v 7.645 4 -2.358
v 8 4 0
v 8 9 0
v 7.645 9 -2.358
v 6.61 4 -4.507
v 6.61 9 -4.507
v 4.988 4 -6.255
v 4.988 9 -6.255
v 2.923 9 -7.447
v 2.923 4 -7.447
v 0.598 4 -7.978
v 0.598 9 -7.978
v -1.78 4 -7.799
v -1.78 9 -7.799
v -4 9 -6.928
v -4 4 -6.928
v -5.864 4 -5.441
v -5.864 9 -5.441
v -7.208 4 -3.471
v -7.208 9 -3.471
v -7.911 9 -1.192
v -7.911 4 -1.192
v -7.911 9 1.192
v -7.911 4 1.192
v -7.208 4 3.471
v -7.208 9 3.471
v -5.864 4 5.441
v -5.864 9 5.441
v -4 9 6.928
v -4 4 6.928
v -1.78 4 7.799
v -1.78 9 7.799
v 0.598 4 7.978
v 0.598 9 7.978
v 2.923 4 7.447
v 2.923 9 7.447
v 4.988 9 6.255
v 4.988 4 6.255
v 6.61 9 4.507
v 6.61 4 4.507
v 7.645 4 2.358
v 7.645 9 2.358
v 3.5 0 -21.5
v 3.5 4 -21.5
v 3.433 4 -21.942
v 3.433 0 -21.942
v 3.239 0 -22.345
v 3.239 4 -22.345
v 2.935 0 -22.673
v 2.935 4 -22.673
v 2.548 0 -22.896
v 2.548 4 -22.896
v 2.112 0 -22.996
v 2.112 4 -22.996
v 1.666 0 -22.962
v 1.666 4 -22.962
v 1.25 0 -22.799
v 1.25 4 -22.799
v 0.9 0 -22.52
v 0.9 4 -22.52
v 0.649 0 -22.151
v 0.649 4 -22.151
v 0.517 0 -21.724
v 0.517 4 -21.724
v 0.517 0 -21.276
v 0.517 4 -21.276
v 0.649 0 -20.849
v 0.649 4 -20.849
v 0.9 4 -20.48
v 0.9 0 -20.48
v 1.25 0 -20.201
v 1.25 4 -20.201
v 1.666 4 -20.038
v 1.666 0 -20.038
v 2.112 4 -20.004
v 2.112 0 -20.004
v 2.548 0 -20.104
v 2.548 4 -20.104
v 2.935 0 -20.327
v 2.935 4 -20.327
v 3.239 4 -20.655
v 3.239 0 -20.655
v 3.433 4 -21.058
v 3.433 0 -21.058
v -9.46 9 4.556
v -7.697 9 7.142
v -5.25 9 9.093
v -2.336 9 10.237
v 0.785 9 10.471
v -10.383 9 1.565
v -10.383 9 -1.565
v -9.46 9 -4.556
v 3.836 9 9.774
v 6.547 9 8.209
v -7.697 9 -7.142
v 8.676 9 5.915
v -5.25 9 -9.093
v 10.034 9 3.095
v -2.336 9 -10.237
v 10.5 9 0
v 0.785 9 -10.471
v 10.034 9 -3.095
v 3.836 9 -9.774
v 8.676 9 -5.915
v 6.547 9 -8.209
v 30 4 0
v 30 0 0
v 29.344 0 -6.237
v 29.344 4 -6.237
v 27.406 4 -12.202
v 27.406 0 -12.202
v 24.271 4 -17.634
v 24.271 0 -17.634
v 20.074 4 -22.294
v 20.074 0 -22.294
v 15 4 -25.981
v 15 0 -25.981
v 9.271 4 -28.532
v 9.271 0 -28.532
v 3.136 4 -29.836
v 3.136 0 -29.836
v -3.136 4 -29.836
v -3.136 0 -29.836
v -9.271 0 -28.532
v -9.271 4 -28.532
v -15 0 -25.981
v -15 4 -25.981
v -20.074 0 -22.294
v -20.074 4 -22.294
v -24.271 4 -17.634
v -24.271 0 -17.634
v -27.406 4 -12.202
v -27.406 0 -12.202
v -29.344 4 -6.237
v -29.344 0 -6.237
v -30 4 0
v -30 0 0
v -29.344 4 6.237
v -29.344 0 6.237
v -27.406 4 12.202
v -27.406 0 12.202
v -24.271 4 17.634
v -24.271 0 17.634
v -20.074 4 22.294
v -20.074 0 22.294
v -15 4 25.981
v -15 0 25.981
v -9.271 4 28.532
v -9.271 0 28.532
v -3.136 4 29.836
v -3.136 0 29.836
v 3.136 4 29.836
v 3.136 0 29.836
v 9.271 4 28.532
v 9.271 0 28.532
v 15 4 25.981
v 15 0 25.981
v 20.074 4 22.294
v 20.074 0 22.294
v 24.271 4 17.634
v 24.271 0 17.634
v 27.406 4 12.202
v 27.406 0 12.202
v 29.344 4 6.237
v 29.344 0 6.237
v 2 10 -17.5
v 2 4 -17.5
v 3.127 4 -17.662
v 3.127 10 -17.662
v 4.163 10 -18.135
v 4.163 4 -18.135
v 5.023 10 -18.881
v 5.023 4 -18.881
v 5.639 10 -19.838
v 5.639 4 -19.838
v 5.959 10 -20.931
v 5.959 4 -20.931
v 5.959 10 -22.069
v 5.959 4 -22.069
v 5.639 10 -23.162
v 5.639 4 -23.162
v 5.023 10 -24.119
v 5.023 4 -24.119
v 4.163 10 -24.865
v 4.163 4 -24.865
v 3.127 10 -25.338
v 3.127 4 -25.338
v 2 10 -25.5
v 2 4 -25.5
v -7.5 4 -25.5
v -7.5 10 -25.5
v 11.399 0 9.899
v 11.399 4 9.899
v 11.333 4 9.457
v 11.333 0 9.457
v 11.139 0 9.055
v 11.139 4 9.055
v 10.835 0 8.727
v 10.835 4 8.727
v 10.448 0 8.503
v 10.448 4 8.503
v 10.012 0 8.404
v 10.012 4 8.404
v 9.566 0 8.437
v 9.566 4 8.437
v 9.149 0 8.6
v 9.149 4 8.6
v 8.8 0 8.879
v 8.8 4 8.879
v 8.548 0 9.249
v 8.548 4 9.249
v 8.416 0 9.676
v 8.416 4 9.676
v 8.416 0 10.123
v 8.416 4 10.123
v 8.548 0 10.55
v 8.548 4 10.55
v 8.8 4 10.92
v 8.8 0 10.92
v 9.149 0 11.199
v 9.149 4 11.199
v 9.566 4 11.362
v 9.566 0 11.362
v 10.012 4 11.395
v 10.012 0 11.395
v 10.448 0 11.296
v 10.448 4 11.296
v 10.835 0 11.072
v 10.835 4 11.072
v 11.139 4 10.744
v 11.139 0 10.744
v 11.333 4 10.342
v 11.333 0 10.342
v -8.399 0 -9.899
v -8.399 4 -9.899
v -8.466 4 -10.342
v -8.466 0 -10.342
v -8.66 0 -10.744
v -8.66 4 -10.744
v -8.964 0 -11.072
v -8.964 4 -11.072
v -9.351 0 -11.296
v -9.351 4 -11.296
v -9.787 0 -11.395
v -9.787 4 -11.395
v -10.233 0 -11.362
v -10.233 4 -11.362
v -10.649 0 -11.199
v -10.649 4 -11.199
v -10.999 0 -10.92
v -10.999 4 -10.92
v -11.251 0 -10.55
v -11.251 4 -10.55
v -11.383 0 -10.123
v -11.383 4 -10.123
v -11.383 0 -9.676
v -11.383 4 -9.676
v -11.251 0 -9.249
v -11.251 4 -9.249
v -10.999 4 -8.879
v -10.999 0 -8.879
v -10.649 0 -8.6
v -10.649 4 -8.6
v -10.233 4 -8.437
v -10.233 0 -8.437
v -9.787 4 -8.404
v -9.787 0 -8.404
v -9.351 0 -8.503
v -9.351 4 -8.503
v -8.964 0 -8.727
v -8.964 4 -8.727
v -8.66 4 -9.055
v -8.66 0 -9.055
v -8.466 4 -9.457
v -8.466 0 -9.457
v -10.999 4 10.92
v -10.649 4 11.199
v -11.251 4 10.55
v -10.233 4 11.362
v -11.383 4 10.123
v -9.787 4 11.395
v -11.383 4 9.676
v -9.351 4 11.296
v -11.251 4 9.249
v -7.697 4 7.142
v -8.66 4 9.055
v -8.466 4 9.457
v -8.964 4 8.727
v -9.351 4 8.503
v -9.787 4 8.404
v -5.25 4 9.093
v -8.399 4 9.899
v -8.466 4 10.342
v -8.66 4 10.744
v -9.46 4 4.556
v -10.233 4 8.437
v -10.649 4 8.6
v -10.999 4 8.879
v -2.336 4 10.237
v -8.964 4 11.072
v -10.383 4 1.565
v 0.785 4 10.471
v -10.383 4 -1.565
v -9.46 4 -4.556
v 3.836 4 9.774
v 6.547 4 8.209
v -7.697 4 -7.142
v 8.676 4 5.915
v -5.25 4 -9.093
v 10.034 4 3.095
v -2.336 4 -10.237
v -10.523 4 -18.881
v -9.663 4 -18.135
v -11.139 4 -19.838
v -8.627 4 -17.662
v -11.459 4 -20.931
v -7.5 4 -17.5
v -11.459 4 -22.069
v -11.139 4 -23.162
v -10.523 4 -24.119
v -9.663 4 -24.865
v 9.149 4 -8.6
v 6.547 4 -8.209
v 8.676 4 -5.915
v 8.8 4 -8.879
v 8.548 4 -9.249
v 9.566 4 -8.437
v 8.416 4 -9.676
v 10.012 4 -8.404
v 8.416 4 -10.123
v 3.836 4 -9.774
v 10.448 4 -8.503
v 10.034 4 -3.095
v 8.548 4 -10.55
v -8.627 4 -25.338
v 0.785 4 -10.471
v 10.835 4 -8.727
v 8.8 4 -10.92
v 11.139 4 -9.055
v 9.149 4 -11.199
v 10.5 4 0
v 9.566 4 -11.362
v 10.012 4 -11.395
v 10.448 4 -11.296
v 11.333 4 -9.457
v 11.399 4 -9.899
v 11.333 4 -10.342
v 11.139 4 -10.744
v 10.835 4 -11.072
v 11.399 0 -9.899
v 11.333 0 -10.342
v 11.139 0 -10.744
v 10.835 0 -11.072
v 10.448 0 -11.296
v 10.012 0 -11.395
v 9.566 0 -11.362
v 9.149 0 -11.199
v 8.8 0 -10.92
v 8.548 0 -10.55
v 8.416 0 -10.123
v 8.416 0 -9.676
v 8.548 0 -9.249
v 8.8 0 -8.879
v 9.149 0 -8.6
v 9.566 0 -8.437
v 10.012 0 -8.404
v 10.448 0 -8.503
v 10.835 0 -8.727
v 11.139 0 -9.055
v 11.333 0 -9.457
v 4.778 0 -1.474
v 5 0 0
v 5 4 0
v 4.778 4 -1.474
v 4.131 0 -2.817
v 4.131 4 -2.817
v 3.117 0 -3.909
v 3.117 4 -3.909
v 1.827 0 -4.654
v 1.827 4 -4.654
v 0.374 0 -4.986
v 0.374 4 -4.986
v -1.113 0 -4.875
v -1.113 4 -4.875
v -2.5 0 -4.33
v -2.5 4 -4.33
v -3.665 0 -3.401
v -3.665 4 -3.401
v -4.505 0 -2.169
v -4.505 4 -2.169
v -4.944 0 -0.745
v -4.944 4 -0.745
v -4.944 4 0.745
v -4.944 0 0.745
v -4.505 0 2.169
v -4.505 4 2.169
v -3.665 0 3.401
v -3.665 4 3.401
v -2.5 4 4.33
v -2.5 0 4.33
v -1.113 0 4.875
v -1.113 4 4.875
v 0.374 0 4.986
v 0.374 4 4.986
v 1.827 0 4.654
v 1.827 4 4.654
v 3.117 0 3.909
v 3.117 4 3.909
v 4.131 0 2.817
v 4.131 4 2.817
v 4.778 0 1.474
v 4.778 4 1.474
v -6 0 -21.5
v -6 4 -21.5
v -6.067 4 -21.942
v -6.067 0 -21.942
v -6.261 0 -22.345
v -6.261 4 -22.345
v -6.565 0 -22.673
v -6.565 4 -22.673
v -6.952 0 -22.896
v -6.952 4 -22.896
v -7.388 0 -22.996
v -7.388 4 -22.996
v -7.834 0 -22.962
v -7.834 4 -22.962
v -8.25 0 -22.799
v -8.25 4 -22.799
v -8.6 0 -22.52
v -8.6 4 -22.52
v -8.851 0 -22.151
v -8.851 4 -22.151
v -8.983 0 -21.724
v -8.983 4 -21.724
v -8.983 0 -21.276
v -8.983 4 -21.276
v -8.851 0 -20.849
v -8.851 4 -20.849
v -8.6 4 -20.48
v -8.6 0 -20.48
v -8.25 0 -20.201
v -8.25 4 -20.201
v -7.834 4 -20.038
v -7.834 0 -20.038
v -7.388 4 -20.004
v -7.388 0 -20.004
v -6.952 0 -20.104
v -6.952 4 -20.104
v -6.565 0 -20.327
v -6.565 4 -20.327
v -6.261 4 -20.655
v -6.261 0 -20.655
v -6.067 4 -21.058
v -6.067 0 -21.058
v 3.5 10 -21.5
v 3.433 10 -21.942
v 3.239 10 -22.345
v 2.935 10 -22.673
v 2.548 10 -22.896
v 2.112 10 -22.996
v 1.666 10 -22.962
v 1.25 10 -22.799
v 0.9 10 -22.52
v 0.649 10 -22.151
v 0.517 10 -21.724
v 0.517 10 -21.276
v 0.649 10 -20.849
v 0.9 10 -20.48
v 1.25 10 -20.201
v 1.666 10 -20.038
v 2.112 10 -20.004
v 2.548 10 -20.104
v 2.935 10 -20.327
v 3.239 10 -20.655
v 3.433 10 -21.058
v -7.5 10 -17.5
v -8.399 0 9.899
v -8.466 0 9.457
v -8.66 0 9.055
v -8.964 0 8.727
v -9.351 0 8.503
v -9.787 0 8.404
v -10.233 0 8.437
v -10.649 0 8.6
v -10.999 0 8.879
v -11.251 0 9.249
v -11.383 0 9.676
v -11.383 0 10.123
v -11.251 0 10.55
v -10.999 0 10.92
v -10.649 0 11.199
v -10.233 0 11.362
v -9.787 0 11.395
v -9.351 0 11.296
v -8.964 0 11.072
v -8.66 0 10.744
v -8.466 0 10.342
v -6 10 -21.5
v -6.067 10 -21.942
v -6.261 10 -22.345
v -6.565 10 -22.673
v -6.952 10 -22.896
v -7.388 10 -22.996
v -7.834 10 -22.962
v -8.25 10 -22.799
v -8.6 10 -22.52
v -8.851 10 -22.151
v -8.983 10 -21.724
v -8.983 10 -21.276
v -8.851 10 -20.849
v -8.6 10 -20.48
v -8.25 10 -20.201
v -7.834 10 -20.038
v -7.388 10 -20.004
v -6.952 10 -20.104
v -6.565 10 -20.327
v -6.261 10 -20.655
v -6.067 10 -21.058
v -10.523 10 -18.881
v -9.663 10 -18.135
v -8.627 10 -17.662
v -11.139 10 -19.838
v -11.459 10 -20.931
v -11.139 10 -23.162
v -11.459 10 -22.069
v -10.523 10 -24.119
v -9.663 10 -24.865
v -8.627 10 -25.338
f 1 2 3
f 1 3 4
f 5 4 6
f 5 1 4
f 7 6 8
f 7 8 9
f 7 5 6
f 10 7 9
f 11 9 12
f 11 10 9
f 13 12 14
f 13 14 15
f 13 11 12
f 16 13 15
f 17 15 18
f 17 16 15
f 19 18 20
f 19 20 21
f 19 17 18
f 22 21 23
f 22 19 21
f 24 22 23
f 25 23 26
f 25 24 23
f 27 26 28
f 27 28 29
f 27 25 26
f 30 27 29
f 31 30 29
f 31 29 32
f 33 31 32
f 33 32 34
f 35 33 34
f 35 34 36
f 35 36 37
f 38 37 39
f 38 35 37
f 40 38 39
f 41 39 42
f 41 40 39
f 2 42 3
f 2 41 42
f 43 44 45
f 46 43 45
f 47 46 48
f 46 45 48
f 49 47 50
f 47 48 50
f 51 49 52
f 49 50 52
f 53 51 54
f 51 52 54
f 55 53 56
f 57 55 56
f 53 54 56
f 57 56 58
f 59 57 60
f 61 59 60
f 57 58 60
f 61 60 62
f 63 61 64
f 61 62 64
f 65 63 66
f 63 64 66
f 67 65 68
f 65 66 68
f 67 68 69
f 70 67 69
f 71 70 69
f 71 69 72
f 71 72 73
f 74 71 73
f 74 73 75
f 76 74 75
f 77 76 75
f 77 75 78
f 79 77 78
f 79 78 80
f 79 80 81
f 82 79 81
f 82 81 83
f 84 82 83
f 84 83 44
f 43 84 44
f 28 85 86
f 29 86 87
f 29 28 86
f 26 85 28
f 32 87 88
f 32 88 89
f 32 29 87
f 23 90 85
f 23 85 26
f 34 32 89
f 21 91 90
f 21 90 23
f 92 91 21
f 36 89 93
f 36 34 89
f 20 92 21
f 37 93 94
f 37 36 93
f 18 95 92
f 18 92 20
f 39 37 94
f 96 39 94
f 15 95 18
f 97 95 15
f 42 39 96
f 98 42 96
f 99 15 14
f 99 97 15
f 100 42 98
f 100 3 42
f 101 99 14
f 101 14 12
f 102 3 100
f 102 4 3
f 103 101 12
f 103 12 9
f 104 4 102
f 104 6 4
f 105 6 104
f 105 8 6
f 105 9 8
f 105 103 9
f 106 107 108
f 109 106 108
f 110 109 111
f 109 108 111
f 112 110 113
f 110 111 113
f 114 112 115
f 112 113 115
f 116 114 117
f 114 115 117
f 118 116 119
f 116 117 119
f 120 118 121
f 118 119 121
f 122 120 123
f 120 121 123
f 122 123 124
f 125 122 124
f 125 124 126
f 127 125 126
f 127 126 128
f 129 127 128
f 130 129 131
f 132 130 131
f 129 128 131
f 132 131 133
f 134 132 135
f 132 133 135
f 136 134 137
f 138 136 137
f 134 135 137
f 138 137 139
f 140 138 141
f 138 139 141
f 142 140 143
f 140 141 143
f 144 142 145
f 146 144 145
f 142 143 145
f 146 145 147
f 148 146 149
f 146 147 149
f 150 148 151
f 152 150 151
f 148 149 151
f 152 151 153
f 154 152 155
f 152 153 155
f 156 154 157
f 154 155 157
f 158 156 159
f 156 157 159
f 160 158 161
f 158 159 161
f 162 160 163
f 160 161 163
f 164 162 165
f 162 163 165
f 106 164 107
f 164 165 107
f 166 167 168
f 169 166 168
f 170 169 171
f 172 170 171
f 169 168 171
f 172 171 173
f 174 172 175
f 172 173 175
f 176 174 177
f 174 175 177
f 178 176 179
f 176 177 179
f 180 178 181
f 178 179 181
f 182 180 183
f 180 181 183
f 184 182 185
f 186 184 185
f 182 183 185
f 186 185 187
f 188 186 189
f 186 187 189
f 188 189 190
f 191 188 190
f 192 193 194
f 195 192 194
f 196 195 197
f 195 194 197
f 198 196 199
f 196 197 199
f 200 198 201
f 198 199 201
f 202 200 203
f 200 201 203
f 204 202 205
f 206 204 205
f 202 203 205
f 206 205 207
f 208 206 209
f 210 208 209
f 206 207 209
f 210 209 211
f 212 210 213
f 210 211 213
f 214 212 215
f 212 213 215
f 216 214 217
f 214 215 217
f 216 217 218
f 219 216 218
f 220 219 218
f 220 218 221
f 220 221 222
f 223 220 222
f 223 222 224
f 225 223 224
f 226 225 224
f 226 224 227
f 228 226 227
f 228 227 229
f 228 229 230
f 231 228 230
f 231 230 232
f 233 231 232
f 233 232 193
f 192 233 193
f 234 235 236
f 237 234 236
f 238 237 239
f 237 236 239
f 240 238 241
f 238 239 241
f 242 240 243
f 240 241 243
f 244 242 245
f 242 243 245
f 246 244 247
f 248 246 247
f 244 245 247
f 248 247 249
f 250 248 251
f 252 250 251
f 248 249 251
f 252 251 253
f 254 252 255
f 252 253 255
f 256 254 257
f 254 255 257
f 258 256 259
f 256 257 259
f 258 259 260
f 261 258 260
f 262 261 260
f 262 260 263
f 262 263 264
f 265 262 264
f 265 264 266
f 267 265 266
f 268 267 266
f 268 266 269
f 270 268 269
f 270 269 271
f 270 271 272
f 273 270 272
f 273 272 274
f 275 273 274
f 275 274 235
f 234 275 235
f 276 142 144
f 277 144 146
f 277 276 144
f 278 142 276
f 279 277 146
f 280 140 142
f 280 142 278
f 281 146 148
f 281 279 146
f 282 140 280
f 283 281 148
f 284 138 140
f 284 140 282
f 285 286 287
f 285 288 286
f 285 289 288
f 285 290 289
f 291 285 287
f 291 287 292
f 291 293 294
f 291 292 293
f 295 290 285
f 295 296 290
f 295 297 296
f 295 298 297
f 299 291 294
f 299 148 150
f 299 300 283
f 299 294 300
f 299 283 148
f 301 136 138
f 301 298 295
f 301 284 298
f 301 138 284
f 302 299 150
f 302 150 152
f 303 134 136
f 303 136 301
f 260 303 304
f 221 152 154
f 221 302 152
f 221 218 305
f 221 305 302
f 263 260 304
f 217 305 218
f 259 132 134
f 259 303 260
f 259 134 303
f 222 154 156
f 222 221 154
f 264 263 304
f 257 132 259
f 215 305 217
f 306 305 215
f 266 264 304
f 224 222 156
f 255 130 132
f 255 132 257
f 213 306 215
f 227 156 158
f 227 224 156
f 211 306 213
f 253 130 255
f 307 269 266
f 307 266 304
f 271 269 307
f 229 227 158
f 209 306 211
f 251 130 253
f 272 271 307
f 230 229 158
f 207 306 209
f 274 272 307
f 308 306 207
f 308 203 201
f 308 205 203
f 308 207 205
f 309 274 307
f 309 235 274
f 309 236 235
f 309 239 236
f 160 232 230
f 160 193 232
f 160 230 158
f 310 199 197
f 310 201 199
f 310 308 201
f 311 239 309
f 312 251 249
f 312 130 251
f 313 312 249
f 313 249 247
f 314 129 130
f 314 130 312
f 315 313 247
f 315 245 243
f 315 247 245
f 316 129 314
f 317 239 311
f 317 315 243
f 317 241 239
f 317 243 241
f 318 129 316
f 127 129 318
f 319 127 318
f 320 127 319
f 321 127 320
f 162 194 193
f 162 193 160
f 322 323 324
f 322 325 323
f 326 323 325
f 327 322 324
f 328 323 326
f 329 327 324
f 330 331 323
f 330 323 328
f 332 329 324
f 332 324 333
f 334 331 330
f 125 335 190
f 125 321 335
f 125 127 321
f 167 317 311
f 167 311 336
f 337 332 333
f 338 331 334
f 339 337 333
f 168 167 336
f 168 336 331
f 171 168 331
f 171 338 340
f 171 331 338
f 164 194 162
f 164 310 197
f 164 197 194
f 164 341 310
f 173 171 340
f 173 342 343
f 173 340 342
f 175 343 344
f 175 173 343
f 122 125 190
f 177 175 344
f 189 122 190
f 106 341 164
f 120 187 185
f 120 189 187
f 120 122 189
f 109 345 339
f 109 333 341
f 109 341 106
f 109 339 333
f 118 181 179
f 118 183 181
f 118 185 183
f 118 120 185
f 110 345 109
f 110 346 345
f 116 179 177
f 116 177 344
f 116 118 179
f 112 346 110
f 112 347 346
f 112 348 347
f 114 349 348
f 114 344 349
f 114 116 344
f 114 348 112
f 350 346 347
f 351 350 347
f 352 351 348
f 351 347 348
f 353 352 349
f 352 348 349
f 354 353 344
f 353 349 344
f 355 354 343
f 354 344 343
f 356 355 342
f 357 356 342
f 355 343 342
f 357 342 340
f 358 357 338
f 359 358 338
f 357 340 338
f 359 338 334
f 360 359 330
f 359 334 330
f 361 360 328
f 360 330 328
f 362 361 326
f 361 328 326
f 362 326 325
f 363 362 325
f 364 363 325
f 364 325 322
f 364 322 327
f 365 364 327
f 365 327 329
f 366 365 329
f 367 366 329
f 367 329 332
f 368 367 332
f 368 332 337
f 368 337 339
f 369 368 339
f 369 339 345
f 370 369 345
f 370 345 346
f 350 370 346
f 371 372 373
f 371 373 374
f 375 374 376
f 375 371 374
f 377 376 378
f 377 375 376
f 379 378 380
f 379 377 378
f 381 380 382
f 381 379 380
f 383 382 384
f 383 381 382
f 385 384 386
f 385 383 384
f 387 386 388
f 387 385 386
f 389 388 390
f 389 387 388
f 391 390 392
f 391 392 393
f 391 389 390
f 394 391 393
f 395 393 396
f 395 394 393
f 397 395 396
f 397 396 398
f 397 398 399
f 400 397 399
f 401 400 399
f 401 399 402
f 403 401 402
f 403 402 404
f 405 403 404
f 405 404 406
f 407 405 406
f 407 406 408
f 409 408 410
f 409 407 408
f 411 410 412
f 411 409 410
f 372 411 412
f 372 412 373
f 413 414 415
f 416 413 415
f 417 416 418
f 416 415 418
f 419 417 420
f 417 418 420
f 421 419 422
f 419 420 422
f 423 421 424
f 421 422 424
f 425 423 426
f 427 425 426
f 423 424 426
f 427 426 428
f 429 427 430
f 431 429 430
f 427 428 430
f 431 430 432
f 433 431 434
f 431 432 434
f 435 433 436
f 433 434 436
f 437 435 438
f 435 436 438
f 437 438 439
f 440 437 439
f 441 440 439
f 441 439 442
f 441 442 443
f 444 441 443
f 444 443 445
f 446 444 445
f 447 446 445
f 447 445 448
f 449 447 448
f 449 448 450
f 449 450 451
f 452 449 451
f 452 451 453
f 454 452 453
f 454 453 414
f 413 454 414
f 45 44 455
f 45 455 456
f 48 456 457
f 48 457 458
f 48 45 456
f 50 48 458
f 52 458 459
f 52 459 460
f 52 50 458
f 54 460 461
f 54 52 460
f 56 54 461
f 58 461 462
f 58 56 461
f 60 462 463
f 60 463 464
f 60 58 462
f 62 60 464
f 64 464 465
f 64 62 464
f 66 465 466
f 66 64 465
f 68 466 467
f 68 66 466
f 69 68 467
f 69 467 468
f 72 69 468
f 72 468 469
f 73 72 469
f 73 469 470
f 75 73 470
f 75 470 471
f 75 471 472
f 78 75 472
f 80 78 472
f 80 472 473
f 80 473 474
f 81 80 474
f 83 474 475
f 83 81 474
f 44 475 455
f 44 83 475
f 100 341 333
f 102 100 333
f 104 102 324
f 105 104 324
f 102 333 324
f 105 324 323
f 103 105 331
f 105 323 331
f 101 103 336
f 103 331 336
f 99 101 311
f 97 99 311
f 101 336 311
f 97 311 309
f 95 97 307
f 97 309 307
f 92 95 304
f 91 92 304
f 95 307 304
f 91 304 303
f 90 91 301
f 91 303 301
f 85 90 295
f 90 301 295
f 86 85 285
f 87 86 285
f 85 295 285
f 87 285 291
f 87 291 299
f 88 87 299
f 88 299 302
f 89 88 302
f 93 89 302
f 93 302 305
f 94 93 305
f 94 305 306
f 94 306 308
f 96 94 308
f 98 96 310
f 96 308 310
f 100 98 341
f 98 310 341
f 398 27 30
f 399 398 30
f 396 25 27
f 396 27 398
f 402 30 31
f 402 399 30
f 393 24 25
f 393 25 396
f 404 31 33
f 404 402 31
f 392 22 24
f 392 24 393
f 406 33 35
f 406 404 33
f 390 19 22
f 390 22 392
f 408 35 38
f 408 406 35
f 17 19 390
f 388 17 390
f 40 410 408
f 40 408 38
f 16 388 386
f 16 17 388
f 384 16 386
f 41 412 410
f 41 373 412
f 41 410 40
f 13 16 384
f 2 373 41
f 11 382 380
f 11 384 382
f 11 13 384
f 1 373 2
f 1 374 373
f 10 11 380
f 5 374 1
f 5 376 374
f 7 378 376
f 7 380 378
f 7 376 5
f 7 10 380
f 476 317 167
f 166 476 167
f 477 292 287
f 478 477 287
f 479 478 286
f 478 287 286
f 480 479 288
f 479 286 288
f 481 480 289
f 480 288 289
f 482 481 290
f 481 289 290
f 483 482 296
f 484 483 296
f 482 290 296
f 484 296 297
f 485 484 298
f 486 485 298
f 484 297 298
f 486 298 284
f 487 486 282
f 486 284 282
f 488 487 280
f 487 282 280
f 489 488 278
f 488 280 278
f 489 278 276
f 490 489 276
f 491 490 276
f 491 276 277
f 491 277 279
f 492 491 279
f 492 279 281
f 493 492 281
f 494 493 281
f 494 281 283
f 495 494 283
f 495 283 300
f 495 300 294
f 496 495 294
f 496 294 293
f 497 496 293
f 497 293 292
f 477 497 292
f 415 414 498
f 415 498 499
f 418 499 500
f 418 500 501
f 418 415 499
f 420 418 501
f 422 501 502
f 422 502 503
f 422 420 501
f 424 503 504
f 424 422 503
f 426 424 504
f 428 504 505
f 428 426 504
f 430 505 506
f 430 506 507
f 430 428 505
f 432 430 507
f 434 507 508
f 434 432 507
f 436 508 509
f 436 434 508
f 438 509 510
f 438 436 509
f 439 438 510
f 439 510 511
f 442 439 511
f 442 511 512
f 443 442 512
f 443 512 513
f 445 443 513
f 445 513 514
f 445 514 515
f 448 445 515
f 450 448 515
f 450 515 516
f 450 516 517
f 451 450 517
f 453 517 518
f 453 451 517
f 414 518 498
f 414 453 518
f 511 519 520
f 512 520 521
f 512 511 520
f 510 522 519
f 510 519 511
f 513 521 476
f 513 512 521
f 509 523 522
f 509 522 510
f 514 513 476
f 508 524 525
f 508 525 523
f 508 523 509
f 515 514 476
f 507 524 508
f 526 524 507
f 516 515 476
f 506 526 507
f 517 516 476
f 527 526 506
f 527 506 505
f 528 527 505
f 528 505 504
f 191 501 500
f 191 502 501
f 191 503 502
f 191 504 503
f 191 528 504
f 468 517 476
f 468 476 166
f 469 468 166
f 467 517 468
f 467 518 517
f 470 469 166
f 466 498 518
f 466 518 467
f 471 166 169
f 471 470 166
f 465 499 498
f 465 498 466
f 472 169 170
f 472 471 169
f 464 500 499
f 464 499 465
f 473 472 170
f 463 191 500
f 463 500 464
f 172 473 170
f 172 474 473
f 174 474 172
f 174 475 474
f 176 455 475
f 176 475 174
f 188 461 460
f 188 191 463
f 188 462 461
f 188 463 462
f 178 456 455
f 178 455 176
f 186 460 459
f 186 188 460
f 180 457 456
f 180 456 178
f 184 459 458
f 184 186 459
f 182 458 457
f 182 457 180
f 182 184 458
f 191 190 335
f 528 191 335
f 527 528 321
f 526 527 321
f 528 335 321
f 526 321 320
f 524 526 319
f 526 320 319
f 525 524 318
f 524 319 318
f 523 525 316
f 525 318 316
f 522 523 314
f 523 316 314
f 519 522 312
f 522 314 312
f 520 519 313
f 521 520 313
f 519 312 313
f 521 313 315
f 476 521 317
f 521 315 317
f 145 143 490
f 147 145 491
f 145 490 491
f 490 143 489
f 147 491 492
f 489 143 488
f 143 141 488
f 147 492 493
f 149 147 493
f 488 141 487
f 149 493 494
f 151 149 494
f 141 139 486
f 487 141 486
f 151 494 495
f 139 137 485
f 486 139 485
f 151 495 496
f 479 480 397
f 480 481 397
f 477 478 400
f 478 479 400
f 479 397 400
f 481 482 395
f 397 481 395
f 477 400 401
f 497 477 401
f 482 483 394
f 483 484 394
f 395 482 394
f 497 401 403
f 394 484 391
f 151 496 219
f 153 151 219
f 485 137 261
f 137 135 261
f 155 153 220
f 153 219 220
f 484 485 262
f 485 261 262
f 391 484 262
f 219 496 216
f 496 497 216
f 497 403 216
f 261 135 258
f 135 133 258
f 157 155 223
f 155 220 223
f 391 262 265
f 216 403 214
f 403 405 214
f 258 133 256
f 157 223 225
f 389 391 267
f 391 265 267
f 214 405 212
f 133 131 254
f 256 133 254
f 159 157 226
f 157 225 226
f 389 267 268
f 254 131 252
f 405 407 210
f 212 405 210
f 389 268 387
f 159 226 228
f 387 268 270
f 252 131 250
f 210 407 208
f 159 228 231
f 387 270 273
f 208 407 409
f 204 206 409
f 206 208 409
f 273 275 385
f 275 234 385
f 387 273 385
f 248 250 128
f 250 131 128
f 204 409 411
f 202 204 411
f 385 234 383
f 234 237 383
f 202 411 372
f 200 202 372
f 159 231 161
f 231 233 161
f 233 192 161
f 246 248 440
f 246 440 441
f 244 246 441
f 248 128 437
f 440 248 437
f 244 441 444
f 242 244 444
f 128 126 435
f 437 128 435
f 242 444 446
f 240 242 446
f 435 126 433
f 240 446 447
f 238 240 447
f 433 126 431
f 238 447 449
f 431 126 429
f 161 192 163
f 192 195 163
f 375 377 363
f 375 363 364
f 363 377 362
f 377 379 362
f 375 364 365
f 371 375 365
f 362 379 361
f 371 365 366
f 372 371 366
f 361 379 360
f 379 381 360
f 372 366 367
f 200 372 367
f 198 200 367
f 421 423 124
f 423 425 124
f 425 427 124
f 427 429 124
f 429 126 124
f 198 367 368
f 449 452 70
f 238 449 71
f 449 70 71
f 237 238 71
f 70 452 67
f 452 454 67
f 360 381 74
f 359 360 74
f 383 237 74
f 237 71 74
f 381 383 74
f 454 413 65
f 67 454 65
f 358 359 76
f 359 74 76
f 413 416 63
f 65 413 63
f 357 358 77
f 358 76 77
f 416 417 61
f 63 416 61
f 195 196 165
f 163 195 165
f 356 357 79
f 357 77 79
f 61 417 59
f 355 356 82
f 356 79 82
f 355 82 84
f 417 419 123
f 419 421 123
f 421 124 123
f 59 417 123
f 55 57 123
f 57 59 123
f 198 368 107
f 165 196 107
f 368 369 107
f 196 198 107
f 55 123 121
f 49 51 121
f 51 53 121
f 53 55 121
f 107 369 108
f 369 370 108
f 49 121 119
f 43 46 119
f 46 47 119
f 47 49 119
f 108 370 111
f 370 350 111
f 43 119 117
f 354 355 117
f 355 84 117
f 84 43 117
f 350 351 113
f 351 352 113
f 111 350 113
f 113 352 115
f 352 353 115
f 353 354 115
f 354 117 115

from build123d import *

# Parameters (mm, degrees)
SKETCH1_R           = 30
SKETCH1_R_2         = 5
BOSS_EXTRUDE1_DEPTH = 4
SKETCH4_R           = 10.5
SKETCH4_R_2         = 8
BOSS_EXTRUDE2_DEPTH = 5
SKETCH6_R           = 1.5
CUT_EXTRUDE3_DEPTH  = 5
SKETCH7_R           = 1.5
BOSS_EXTRUDE3_DEPTH = 6
SKETCH8_R           = 1.5
CUT_EXTRUDE4_DEPTH  = 5


with BuildPart() as part:
    # Sketch1 → Boss-Extrude1 (new body)
    with BuildSketch(Plane(origin=(0, 0, 0), x_dir=(1, 0, 0), z_dir=(0, 1, 0))):
        Circle(SKETCH1_R)
        Circle(SKETCH1_R_2, mode=Mode.SUBTRACT)
    extrude(amount=BOSS_EXTRUDE1_DEPTH)

    # Sketch4 → Boss-Extrude2 (add)
    with BuildSketch(Plane(origin=(0, 4, 0), x_dir=(1, 0, 0), z_dir=(0, 1, 0))):
        Circle(SKETCH4_R)
        Circle(SKETCH4_R_2, mode=Mode.SUBTRACT)
    extrude(amount=BOSS_EXTRUDE2_DEPTH)

    # Sketch6 → Cut-Extrude3 (cut, through all)
    with BuildSketch(Plane(origin=(0, 4, 0), x_dir=(1, 0, 0), z_dir=(0, 1, 0))):
        with Locations((-7.5, 21.5)):
            Circle(SKETCH6_R)
        with Locations((2, 21.5)):
            Circle(SKETCH6_R)
    extrude(amount=-CUT_EXTRUDE3_DEPTH, mode=Mode.SUBTRACT)

    # Sketch7 → Boss-Extrude3 (add)
    with BuildSketch(Plane(origin=(0, 4, 0), x_dir=(1, 0, 0), z_dir=(0, 1, 0))):
        with BuildLine():
            Line((2, 25.5), (-7.5, 25.5))
            ThreePointArc((-7.5, 25.5), (-11.5, 21.5), (-7.5, 17.5))
            Line((-7.5, 17.5), (2, 17.5))
            ThreePointArc((2, 17.5), (6, 21.5), (2, 25.5))
        make_face()
        with Locations((-7.5, 21.5)):
            Circle(SKETCH7_R, mode=Mode.SUBTRACT)
        with Locations((2, 21.5)):
            Circle(SKETCH7_R, mode=Mode.SUBTRACT)
    extrude(amount=BOSS_EXTRUDE3_DEPTH)

    # Sketch8 → Cut-Extrude4 (cut, through all)
    with BuildSketch(Plane(origin=(0, 4, 0), x_dir=(1, 0, 0), z_dir=(0, 1, 0))):
        with Locations((-9.899494937, 9.899494937)):
            Circle(SKETCH8_R)
        with Locations((9.899494937, 9.899494937)):
            Circle(SKETCH8_R)
        with Locations((9.899494937, -9.899494937)):
            Circle(SKETCH8_R)
        with Locations((-9.899494937, -9.899494937)):
            Circle(SKETCH8_R)
    extrude(amount=-CUT_EXTRUDE4_DEPTH, mode=Mode.SUBTRACT)


solid = part.part
